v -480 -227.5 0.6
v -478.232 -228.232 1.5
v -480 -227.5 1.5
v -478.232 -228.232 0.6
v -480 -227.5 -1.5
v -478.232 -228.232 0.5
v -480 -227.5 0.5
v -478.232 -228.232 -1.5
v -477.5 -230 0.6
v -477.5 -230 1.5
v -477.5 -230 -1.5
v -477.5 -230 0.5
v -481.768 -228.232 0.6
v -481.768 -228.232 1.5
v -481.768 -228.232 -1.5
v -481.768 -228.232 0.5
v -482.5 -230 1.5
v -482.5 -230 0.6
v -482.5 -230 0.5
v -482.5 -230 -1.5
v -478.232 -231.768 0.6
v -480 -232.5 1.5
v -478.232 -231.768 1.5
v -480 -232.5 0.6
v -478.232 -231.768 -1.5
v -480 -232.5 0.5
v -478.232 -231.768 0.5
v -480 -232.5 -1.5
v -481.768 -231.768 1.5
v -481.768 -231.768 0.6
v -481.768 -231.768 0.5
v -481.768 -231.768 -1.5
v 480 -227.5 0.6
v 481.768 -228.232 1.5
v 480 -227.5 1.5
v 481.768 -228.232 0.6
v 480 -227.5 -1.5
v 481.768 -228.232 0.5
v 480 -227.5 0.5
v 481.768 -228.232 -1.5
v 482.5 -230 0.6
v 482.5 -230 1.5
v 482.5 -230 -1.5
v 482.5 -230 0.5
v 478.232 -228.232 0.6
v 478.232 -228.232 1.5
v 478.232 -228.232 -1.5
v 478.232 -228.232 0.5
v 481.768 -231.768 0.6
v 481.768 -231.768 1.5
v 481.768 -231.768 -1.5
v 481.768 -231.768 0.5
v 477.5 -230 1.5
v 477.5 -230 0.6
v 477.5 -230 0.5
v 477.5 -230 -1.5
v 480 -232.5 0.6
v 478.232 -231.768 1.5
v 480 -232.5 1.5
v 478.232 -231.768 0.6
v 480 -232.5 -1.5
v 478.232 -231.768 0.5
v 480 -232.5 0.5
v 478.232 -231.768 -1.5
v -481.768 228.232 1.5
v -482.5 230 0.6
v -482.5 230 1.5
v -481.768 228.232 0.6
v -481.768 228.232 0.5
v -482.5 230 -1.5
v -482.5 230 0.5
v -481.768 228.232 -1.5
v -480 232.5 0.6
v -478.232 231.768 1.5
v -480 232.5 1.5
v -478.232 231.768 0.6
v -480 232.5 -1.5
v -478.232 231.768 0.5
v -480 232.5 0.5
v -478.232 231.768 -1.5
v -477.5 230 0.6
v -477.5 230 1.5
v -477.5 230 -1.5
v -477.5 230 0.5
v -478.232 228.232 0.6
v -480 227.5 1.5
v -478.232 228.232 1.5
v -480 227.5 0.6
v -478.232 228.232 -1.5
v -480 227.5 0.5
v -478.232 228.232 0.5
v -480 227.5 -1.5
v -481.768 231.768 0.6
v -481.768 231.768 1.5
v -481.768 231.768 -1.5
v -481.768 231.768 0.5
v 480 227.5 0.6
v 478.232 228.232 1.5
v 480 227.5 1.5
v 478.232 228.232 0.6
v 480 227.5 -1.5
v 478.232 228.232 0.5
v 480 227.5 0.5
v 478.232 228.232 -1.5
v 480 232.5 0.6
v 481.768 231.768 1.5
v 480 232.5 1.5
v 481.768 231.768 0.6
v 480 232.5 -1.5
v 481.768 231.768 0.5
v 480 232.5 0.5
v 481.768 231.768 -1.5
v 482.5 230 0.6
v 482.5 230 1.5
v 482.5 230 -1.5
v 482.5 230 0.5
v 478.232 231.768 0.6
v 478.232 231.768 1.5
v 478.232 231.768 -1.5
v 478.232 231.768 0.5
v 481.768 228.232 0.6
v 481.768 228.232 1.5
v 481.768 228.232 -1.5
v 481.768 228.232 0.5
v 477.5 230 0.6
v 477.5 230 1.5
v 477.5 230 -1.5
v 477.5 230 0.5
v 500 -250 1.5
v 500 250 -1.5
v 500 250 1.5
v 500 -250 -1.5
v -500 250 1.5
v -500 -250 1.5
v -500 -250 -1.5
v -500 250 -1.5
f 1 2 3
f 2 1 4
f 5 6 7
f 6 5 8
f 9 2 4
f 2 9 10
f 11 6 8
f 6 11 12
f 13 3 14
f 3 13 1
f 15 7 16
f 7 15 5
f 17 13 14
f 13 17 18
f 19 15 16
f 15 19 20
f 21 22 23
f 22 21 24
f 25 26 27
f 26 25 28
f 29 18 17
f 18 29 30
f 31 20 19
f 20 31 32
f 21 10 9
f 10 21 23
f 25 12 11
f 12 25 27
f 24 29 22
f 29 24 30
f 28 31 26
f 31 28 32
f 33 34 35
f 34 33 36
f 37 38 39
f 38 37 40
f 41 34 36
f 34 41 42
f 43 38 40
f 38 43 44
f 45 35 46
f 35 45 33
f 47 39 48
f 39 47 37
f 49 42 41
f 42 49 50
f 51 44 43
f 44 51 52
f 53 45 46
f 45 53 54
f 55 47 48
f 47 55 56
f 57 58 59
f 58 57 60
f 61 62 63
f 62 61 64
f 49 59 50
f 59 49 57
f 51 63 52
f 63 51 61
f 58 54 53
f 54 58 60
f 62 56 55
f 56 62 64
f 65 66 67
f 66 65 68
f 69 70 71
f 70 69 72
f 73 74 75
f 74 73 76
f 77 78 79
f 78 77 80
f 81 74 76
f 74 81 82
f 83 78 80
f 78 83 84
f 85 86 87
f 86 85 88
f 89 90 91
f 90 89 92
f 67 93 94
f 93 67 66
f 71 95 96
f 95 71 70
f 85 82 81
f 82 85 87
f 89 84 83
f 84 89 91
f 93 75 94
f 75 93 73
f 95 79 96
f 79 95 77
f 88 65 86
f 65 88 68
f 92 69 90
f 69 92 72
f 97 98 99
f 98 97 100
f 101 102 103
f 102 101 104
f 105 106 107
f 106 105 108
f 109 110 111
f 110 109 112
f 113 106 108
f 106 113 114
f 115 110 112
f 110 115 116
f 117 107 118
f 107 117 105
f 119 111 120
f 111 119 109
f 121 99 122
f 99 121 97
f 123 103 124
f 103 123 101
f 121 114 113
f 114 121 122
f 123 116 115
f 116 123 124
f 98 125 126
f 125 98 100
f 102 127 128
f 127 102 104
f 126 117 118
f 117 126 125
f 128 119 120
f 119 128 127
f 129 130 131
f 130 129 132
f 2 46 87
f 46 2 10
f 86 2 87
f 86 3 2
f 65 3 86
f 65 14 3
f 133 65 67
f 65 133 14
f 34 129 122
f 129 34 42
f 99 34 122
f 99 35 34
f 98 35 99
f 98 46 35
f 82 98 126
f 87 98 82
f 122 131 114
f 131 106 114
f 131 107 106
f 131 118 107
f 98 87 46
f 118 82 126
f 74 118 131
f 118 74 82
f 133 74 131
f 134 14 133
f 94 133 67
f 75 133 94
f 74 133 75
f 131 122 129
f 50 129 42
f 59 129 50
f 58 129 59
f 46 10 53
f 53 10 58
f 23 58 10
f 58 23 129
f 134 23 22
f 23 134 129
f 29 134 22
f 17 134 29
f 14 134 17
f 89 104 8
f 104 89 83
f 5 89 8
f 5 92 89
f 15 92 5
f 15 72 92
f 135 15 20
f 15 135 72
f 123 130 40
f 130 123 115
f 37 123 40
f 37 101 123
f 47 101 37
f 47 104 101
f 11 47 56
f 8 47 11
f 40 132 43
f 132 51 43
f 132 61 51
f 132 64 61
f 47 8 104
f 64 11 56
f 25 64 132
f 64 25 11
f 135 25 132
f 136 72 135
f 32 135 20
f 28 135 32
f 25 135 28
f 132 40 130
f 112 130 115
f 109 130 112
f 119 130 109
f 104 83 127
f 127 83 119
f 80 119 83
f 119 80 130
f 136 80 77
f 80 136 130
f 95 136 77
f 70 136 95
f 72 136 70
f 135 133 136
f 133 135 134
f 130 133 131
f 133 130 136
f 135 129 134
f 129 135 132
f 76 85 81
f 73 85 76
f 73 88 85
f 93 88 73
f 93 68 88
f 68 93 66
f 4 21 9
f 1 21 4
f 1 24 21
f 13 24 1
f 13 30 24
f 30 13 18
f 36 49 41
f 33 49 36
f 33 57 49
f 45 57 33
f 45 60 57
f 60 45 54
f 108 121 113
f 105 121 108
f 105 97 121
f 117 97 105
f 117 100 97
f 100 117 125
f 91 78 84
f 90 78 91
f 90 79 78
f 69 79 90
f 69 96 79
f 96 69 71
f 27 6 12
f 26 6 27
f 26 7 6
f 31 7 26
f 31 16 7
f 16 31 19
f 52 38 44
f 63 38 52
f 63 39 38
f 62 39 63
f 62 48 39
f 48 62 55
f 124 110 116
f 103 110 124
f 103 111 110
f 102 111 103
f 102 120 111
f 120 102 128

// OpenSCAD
// Parameters
sheet_L = 1000; //[500:2000:1]
sheet_W = 500; //[250:1000:1]
sheet_T = 3; //[1.5:6:0.1]
corner_R = 0; //[0:50:1]
hole_d = 5; //[2:12:0.1]
hole_edge_offset = 20; //[5:100:1]
hole_count_x = 2; //[1:10:1]
hole_count_y = 2; //[1:10:1]
edge_chamfer = 0; //[0:2:0.1]
film_T = 0.1; //[0.05:0.3:0.01]
overlap = 1; //[0.5:2:0.1]

// Base shapes
module sheet_panel_base() {
  cube([sheet_L, sheet_W, sheet_T], center=true);
}

module corner_cut_cyl() {
  cylinder(r=corner_R, h=sheet_T + 2*overlap, center=true);
}

module hole_cyl_base() {
  cylinder(r=hole_d/2, h=sheet_T + 2*overlap, center=true);
}

module protective_film_layer() {
  cube([sheet_L, sheet_W, film_T], center=true);
}

module edge_chamfer_layer() {
  cube([sheet_L - 2*edge_chamfer, sheet_W - 2*edge_chamfer, sheet_T], center=true);
}

// Operations
module corner_radius() {
  difference() {
    sheet_panel_base();
    if (corner_R > 0) {
      translate([sheet_L/2 - corner_R, sheet_W/2 - corner_R, 0]) corner_cut_cyl();
      translate([sheet_L/2 - corner_R, -sheet_W/2 + corner_R, 0]) corner_cut_cyl();
      translate([-sheet_L/2 + corner_R, sheet_W/2 - corner_R, 0]) corner_cut_cyl();
      translate([-sheet_L/2 + corner_R, -sheet_W/2 + corner_R, 0]) corner_cut_cyl();
    }
  }
}

module mounting_holes_pattern() {
  union() {
    translate([-sheet_L/2 + hole_edge_offset, -sheet_W/2 + hole_edge_offset, 0]) hole_cyl_base();
    translate([sheet_L/2 - hole_edge_offset, -sheet_W/2 + hole_edge_offset, 0]) hole_cyl_base();
    translate([-sheet_L/2 + hole_edge_offset, sheet_W/2 - hole_edge_offset, 0]) hole_cyl_base();
    translate([sheet_L/2 - hole_edge_offset, sheet_W/2 - hole_edge_offset, 0]) hole_cyl_base();
  }
}

module sheet_with_holes() {
  difference() {
    corner_radius();
    mounting_holes_pattern();
  }
}

module edge_chamfer() {
  intersection() {
    sheet_with_holes();
    edge_chamfer_layer();
  }
}

module complete_model() {
  union() {
    edge_chamfer();
    translate([0, 0, sheet_T/2 + film_T/2 - overlap]) protective_film_layer();
  }
}

// Final output
complete_model();
